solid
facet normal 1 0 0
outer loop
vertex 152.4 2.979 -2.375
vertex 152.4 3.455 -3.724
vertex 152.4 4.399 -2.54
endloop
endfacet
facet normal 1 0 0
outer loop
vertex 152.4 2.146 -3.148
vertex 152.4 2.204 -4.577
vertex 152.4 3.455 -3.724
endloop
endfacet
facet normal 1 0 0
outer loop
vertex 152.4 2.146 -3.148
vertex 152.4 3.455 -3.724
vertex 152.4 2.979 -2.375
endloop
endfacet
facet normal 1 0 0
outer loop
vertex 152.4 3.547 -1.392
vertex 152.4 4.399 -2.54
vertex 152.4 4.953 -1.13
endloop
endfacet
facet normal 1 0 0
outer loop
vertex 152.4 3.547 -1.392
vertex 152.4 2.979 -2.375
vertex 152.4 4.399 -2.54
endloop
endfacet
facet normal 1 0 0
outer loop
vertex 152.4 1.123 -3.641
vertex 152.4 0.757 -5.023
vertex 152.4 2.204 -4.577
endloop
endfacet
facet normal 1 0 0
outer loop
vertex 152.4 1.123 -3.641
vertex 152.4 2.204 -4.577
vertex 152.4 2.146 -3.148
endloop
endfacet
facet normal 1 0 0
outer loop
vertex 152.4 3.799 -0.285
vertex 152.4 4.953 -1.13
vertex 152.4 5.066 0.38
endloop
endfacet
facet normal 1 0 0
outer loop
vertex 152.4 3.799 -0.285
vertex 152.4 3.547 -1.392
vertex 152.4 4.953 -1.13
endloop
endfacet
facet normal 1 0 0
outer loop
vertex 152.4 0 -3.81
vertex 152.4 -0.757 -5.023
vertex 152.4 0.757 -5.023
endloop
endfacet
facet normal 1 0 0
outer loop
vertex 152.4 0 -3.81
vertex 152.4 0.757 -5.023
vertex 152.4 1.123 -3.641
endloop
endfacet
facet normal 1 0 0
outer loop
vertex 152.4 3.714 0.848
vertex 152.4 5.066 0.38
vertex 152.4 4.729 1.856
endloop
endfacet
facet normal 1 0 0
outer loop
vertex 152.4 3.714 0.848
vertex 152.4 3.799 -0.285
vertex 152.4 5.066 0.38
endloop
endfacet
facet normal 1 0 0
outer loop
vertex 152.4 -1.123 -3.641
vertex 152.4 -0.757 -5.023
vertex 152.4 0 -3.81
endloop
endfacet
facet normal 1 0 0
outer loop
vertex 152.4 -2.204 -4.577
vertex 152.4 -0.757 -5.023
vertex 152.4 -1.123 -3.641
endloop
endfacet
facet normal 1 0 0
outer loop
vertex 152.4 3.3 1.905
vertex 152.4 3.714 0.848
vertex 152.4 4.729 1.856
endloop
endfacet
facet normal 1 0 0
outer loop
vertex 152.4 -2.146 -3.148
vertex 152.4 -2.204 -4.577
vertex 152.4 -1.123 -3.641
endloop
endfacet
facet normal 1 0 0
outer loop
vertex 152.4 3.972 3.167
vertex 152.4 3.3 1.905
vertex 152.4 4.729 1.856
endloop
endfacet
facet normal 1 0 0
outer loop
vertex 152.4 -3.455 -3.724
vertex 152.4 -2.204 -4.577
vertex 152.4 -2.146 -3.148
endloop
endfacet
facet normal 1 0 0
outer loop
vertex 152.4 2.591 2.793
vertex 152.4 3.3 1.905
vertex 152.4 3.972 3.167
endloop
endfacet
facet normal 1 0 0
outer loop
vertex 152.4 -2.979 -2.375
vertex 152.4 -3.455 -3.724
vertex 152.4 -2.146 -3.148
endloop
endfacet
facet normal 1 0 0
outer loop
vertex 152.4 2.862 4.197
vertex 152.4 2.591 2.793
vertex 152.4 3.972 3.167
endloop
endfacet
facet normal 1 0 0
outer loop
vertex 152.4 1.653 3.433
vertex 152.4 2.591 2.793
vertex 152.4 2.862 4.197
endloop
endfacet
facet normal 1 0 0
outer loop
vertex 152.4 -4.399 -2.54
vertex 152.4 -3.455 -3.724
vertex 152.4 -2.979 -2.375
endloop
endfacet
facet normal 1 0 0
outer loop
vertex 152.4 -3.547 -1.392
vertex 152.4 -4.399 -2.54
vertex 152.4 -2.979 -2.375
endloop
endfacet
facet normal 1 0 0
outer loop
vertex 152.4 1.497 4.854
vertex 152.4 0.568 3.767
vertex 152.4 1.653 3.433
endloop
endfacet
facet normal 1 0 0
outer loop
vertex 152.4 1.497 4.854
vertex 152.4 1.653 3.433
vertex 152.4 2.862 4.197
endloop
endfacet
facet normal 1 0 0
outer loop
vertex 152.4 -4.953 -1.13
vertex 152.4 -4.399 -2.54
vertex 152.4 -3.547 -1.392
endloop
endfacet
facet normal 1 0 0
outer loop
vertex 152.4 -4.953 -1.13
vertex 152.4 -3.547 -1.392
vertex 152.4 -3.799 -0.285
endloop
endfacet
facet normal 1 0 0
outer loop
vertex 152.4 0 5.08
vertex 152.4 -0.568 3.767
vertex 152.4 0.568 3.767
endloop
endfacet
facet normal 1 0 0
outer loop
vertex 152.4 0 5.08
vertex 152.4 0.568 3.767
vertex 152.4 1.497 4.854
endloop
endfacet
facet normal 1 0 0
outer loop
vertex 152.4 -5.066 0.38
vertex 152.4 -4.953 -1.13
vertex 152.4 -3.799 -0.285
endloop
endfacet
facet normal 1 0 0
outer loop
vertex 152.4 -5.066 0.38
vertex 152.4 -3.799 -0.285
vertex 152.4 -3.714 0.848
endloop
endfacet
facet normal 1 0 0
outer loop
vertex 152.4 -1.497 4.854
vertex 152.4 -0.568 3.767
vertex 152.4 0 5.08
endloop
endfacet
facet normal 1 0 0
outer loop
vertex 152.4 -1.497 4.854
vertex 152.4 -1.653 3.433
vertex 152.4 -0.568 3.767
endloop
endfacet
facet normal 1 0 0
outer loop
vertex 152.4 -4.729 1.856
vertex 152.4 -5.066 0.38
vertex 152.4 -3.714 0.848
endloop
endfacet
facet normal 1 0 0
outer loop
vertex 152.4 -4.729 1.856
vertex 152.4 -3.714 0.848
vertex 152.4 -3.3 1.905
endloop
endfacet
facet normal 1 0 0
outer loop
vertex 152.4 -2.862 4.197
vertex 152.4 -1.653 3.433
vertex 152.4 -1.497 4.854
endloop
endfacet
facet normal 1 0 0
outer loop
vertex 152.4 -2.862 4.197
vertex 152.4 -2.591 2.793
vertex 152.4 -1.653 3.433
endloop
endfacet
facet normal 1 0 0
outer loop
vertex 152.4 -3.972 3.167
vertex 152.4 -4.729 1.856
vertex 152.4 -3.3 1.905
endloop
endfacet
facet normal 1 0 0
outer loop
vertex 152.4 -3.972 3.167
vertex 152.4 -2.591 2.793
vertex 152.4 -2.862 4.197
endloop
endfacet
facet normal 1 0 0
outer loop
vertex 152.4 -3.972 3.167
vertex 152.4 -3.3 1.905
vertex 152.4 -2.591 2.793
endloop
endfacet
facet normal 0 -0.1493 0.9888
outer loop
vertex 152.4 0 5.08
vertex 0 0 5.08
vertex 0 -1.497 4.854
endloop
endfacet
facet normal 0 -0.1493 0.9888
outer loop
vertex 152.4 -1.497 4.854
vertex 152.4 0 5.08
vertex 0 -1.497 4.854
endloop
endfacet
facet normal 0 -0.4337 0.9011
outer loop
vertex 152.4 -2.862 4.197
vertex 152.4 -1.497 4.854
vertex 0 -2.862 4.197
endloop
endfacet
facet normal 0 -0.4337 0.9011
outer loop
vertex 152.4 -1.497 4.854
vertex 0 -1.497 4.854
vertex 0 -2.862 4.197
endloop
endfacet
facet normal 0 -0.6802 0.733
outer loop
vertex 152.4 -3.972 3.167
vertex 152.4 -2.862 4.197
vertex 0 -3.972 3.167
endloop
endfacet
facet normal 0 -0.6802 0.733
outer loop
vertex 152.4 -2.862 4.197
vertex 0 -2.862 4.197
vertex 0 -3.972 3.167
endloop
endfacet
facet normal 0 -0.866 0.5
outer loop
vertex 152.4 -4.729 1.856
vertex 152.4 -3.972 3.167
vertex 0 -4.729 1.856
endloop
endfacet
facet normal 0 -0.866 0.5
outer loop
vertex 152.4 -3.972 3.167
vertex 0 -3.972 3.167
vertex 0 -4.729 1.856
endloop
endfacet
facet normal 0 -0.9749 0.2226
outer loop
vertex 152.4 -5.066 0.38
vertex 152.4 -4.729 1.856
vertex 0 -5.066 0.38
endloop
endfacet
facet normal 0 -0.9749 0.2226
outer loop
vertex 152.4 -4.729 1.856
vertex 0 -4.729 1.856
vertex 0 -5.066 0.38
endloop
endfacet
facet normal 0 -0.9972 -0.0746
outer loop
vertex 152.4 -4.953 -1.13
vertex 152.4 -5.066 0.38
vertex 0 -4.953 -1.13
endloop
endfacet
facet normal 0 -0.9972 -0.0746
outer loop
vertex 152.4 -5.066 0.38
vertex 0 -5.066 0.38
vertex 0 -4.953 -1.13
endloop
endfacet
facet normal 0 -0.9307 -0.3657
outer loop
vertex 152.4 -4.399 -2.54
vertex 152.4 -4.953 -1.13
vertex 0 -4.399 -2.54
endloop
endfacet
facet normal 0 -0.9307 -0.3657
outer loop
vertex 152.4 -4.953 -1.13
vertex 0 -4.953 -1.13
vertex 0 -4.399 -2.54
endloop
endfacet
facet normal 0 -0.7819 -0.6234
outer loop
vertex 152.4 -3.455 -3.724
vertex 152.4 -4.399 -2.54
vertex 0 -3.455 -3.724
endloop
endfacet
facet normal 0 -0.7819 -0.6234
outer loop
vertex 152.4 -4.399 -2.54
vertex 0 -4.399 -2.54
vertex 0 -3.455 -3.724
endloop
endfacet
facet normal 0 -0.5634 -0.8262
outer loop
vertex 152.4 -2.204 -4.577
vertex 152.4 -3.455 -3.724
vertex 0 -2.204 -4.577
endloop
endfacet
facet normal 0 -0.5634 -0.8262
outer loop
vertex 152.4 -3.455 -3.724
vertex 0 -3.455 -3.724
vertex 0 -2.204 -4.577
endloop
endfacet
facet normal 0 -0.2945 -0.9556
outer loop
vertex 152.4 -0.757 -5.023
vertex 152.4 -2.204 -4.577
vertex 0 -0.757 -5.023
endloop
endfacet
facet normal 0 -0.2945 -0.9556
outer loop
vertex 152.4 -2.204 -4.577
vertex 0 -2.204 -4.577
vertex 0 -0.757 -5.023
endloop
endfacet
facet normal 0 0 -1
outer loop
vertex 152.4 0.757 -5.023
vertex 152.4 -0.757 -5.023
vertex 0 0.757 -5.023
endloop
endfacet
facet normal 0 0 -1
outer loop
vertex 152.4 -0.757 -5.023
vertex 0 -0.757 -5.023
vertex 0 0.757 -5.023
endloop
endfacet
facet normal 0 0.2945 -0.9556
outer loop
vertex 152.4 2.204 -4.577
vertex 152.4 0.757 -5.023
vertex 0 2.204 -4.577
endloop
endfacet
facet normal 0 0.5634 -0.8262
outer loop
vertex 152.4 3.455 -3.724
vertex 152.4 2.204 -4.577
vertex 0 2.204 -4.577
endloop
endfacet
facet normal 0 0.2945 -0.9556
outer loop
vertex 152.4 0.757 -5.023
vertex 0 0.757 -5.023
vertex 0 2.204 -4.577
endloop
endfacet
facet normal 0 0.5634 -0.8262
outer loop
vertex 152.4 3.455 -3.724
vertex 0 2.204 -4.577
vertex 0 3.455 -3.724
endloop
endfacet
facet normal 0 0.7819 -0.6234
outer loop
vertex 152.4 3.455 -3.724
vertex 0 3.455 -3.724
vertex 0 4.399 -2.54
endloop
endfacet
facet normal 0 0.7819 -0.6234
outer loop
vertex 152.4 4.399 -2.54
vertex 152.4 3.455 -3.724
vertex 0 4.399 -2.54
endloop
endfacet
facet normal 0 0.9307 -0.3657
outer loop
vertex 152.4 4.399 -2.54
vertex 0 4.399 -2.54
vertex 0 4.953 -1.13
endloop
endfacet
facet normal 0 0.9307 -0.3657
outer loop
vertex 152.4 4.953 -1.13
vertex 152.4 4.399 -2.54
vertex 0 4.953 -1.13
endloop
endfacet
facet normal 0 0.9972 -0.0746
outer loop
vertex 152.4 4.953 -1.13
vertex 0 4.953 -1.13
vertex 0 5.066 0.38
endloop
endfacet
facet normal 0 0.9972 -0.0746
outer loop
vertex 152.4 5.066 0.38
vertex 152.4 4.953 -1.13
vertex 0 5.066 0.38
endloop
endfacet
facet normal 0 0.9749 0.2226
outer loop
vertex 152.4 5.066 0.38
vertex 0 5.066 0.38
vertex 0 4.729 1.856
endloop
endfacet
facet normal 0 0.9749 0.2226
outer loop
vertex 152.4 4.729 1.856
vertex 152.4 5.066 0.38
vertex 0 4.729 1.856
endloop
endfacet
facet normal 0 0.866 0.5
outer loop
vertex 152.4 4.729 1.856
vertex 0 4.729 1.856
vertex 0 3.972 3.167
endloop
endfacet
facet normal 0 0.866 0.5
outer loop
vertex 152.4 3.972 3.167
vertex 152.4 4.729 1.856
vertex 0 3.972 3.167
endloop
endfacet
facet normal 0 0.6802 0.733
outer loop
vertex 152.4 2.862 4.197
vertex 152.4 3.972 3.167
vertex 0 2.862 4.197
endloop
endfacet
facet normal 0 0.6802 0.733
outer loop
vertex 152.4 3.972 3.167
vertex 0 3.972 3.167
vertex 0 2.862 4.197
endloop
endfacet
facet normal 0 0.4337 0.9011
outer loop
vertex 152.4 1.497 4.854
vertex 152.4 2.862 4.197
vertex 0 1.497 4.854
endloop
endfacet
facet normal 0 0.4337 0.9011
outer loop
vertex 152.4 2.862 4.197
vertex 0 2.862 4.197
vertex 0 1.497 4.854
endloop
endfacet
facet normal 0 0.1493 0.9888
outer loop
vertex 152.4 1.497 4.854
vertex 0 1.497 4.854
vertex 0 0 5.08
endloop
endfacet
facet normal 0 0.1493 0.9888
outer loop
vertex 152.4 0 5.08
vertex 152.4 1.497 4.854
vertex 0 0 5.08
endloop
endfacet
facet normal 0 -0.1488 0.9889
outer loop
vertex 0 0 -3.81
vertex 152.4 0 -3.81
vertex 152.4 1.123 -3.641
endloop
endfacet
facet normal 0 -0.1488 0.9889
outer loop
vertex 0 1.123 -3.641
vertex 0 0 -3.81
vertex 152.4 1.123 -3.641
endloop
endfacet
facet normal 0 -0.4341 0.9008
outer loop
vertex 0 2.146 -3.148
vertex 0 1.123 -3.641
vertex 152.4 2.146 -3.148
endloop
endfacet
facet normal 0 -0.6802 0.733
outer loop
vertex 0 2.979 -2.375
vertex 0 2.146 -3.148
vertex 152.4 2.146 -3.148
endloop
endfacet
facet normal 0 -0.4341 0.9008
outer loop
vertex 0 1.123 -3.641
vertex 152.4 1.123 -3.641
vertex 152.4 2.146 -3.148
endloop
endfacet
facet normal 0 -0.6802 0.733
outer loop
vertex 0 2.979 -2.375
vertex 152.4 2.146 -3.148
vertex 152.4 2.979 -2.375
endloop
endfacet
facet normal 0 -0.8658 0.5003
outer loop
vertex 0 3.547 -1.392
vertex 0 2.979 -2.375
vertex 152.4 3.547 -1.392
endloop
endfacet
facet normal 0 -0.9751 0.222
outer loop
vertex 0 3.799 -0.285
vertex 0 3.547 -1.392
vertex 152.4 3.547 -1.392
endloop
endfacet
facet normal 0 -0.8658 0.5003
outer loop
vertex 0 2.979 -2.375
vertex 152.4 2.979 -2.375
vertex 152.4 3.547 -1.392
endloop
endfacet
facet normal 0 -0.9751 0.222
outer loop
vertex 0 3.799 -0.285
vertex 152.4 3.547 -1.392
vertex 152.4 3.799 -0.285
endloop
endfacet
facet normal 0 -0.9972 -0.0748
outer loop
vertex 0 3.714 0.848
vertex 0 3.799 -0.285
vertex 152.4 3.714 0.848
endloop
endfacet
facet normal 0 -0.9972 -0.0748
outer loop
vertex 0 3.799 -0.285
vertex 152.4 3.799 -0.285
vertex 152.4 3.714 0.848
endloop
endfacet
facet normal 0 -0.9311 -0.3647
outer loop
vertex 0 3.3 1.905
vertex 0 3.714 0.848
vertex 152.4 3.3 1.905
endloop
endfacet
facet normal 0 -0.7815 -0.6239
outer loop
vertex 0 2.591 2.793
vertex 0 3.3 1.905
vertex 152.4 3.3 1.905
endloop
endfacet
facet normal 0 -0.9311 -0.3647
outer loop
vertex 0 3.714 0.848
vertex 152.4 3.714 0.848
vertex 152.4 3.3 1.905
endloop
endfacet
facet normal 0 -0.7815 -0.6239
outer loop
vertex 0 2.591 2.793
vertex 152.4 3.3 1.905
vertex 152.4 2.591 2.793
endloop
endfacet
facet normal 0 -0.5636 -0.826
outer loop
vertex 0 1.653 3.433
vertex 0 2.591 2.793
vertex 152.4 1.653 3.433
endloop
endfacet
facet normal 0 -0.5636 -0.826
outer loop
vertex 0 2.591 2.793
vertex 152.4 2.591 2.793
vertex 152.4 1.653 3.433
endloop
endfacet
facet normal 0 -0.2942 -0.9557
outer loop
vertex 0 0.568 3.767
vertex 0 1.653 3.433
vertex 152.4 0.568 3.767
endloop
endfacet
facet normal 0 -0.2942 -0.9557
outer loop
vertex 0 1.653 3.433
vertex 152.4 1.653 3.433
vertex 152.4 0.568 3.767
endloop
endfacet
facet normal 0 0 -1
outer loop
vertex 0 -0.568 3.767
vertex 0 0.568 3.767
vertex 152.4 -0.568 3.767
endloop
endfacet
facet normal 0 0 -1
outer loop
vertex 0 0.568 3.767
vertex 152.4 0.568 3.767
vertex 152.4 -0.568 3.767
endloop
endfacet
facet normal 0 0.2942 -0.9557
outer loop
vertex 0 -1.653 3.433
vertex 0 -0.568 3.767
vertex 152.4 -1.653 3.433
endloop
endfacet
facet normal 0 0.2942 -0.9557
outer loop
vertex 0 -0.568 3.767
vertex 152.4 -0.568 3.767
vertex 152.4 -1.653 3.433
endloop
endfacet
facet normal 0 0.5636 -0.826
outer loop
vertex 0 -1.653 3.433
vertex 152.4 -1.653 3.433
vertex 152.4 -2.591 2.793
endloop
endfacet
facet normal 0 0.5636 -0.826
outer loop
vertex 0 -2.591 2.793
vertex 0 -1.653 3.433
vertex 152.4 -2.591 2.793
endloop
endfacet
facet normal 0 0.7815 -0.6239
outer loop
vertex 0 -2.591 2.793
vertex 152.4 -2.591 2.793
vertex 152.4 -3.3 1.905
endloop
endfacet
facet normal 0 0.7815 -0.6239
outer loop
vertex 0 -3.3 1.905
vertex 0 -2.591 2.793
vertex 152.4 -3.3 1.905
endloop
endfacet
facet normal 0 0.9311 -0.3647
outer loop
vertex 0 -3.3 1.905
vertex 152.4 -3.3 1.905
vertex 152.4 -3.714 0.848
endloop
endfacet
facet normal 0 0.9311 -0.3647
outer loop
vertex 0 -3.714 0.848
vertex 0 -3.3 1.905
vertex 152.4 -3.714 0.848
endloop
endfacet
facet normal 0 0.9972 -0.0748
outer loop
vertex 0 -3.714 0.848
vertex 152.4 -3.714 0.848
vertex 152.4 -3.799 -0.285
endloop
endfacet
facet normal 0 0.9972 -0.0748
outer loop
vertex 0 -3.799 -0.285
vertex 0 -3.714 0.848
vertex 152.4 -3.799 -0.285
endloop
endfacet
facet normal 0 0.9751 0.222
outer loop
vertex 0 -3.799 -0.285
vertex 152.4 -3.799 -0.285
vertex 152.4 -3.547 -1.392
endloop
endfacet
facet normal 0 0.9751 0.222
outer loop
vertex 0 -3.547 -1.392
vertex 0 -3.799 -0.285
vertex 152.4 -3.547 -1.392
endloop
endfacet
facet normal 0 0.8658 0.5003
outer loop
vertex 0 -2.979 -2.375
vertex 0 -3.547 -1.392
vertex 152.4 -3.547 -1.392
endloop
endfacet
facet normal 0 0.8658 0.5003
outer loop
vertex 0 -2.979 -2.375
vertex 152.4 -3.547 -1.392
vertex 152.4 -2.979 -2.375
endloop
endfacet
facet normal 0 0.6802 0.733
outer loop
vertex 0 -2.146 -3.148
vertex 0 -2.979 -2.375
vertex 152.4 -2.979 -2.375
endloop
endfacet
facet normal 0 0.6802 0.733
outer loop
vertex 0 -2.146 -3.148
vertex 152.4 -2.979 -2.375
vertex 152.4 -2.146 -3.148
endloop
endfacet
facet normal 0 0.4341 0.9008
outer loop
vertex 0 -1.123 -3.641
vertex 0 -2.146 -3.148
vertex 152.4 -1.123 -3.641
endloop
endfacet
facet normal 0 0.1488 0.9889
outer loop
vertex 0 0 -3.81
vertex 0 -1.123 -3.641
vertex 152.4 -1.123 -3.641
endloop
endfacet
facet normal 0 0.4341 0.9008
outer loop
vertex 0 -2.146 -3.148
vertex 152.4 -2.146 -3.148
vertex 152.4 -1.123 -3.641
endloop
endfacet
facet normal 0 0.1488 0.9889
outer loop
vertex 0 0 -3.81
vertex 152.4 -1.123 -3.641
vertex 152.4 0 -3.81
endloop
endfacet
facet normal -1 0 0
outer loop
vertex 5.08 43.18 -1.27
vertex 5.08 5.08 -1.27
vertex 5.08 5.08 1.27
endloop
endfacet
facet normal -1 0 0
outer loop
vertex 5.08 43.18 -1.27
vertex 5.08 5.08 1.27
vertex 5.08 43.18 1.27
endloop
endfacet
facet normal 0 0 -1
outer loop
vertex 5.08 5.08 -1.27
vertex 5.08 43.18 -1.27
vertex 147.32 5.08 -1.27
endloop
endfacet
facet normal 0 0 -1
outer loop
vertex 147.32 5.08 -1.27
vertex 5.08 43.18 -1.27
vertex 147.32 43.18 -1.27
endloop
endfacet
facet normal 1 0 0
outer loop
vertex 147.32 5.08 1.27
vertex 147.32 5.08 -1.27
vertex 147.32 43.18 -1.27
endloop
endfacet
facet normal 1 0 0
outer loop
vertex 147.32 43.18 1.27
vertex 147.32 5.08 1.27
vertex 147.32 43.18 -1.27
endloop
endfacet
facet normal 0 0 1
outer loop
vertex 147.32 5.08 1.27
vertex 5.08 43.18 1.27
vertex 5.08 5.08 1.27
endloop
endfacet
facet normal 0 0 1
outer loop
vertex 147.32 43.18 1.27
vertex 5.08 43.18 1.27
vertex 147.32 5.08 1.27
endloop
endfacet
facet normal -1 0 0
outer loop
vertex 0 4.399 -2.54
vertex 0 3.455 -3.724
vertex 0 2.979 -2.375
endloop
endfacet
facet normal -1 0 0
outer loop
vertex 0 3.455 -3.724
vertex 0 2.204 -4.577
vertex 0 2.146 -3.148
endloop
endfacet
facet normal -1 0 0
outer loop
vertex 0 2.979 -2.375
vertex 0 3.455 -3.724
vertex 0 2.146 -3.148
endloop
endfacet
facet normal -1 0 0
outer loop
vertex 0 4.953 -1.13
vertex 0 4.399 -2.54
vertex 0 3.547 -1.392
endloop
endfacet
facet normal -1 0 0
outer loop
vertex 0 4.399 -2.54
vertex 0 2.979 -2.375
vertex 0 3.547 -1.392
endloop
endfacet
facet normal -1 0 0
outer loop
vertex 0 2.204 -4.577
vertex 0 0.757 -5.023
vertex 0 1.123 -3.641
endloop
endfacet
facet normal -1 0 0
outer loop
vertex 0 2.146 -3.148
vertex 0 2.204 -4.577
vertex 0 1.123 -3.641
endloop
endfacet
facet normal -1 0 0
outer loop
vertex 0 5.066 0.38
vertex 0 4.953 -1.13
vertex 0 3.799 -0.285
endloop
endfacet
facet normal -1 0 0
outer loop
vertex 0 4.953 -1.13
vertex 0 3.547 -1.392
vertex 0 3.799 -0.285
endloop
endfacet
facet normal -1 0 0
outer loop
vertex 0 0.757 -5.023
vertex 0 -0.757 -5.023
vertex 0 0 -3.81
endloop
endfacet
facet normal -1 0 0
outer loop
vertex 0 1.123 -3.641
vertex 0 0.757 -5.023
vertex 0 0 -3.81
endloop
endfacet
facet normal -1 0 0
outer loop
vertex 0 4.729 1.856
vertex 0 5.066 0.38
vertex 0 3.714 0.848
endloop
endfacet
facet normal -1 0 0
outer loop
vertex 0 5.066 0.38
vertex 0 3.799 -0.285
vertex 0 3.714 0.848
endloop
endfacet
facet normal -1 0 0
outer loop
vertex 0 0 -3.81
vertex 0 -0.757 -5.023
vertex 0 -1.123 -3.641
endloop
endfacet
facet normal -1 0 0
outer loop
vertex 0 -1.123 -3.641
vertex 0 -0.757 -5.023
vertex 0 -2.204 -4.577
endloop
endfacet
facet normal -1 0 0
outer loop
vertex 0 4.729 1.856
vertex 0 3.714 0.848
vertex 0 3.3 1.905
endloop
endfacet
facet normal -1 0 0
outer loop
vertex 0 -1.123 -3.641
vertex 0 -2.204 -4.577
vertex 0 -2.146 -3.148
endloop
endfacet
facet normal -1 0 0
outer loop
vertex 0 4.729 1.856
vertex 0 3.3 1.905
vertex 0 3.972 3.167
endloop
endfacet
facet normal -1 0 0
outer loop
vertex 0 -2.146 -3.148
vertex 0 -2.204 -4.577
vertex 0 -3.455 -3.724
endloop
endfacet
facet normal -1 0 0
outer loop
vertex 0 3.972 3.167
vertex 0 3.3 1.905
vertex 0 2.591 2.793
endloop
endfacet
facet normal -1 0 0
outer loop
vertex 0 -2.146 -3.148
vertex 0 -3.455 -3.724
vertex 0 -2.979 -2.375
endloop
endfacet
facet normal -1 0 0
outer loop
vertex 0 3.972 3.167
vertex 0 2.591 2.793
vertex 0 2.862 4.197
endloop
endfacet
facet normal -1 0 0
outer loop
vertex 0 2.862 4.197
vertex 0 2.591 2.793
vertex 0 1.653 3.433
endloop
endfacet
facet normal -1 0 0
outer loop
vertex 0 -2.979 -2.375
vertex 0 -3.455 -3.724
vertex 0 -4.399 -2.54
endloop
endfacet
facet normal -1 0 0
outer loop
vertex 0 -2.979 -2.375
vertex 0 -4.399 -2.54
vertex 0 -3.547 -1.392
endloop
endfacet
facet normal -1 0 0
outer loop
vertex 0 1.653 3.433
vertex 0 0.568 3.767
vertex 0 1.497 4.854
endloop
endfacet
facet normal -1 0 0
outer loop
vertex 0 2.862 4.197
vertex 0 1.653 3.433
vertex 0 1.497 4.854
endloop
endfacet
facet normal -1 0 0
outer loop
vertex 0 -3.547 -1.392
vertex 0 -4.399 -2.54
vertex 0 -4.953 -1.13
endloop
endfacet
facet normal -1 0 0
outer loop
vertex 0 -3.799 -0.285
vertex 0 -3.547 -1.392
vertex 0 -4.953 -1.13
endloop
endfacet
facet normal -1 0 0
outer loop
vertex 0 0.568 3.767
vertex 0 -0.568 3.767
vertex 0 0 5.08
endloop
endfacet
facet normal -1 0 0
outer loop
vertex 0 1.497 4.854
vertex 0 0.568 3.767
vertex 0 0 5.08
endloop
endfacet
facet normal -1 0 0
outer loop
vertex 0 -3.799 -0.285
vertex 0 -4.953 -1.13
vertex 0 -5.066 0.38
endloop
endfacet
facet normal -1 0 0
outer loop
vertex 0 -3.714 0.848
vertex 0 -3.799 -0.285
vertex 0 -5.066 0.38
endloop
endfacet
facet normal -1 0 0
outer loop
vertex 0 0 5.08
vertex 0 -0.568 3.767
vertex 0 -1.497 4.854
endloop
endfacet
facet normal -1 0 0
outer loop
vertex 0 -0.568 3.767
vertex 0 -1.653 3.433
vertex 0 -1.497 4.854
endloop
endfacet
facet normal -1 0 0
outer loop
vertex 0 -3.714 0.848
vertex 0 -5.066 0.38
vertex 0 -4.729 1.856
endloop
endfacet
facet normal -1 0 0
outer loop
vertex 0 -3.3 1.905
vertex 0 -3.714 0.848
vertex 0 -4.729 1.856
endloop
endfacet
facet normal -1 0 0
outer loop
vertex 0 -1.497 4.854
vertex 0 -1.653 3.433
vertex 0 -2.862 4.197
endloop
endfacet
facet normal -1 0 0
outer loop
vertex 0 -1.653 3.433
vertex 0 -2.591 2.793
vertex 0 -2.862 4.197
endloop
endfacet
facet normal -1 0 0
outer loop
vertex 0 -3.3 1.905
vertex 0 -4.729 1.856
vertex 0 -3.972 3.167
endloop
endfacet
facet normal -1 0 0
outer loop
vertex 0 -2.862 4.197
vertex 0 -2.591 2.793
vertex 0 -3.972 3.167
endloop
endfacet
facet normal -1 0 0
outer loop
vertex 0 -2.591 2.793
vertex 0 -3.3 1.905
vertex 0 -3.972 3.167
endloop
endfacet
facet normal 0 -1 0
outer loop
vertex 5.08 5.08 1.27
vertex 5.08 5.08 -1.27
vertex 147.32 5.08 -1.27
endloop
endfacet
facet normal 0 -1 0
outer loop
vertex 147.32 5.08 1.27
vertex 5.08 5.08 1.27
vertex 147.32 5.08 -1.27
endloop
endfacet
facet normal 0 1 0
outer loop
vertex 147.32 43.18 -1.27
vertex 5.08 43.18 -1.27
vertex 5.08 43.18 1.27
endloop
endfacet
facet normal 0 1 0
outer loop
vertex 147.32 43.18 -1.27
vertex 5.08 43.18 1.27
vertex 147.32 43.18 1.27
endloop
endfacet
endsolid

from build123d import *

# Parameters (mm, degrees)
SKETCH1_R                = 5.08
BOSS_EXTRUDE1_DEPTH      = 152.4
SKETCH2_R                = 3.81
CUT_EXTRUDE1_DEPTH       = 152.4
BOSS_EXTRUDE2_DEPTH      = 1.27
BOSS_EXTRUDE2_DEPTH_BACK = 1.27
SKETCH3_W                = 142.24
SKETCH3_H                = 38.1


with BuildPart() as part:
    # Sketch1 → Boss-Extrude1 (new body)
    with BuildSketch(Plane(origin=(0, 0, 0), x_dir=(0, 0, -1), z_dir=(1, 0, 0))):
        Circle(SKETCH1_R)
    extrude(amount=BOSS_EXTRUDE1_DEPTH)

    # Sketch2 → Cut-Extrude1 (cut)
    with BuildSketch(Plane(origin=(152.4, 0, 0), x_dir=(0, 0, -1), z_dir=(1, 0, 0))):
        Circle(SKETCH2_R)
    extrude(amount=-CUT_EXTRUDE1_DEPTH, mode=Mode.SUBTRACT)


with BuildPart() as body_2:
    # Sketch3 → Boss-Extrude2 (new, two sides: drawn at the far end of the back side and taken through both)
    with BuildSketch(Plane.XY.offset(-BOSS_EXTRUDE2_DEPTH_BACK)):
        with Locations((76.2, 24.13)):
            Rectangle(SKETCH3_W, SKETCH3_H)
    extrude(amount=BOSS_EXTRUDE2_DEPTH + BOSS_EXTRUDE2_DEPTH_BACK)


solid = Compound([part.part, body_2.part])
